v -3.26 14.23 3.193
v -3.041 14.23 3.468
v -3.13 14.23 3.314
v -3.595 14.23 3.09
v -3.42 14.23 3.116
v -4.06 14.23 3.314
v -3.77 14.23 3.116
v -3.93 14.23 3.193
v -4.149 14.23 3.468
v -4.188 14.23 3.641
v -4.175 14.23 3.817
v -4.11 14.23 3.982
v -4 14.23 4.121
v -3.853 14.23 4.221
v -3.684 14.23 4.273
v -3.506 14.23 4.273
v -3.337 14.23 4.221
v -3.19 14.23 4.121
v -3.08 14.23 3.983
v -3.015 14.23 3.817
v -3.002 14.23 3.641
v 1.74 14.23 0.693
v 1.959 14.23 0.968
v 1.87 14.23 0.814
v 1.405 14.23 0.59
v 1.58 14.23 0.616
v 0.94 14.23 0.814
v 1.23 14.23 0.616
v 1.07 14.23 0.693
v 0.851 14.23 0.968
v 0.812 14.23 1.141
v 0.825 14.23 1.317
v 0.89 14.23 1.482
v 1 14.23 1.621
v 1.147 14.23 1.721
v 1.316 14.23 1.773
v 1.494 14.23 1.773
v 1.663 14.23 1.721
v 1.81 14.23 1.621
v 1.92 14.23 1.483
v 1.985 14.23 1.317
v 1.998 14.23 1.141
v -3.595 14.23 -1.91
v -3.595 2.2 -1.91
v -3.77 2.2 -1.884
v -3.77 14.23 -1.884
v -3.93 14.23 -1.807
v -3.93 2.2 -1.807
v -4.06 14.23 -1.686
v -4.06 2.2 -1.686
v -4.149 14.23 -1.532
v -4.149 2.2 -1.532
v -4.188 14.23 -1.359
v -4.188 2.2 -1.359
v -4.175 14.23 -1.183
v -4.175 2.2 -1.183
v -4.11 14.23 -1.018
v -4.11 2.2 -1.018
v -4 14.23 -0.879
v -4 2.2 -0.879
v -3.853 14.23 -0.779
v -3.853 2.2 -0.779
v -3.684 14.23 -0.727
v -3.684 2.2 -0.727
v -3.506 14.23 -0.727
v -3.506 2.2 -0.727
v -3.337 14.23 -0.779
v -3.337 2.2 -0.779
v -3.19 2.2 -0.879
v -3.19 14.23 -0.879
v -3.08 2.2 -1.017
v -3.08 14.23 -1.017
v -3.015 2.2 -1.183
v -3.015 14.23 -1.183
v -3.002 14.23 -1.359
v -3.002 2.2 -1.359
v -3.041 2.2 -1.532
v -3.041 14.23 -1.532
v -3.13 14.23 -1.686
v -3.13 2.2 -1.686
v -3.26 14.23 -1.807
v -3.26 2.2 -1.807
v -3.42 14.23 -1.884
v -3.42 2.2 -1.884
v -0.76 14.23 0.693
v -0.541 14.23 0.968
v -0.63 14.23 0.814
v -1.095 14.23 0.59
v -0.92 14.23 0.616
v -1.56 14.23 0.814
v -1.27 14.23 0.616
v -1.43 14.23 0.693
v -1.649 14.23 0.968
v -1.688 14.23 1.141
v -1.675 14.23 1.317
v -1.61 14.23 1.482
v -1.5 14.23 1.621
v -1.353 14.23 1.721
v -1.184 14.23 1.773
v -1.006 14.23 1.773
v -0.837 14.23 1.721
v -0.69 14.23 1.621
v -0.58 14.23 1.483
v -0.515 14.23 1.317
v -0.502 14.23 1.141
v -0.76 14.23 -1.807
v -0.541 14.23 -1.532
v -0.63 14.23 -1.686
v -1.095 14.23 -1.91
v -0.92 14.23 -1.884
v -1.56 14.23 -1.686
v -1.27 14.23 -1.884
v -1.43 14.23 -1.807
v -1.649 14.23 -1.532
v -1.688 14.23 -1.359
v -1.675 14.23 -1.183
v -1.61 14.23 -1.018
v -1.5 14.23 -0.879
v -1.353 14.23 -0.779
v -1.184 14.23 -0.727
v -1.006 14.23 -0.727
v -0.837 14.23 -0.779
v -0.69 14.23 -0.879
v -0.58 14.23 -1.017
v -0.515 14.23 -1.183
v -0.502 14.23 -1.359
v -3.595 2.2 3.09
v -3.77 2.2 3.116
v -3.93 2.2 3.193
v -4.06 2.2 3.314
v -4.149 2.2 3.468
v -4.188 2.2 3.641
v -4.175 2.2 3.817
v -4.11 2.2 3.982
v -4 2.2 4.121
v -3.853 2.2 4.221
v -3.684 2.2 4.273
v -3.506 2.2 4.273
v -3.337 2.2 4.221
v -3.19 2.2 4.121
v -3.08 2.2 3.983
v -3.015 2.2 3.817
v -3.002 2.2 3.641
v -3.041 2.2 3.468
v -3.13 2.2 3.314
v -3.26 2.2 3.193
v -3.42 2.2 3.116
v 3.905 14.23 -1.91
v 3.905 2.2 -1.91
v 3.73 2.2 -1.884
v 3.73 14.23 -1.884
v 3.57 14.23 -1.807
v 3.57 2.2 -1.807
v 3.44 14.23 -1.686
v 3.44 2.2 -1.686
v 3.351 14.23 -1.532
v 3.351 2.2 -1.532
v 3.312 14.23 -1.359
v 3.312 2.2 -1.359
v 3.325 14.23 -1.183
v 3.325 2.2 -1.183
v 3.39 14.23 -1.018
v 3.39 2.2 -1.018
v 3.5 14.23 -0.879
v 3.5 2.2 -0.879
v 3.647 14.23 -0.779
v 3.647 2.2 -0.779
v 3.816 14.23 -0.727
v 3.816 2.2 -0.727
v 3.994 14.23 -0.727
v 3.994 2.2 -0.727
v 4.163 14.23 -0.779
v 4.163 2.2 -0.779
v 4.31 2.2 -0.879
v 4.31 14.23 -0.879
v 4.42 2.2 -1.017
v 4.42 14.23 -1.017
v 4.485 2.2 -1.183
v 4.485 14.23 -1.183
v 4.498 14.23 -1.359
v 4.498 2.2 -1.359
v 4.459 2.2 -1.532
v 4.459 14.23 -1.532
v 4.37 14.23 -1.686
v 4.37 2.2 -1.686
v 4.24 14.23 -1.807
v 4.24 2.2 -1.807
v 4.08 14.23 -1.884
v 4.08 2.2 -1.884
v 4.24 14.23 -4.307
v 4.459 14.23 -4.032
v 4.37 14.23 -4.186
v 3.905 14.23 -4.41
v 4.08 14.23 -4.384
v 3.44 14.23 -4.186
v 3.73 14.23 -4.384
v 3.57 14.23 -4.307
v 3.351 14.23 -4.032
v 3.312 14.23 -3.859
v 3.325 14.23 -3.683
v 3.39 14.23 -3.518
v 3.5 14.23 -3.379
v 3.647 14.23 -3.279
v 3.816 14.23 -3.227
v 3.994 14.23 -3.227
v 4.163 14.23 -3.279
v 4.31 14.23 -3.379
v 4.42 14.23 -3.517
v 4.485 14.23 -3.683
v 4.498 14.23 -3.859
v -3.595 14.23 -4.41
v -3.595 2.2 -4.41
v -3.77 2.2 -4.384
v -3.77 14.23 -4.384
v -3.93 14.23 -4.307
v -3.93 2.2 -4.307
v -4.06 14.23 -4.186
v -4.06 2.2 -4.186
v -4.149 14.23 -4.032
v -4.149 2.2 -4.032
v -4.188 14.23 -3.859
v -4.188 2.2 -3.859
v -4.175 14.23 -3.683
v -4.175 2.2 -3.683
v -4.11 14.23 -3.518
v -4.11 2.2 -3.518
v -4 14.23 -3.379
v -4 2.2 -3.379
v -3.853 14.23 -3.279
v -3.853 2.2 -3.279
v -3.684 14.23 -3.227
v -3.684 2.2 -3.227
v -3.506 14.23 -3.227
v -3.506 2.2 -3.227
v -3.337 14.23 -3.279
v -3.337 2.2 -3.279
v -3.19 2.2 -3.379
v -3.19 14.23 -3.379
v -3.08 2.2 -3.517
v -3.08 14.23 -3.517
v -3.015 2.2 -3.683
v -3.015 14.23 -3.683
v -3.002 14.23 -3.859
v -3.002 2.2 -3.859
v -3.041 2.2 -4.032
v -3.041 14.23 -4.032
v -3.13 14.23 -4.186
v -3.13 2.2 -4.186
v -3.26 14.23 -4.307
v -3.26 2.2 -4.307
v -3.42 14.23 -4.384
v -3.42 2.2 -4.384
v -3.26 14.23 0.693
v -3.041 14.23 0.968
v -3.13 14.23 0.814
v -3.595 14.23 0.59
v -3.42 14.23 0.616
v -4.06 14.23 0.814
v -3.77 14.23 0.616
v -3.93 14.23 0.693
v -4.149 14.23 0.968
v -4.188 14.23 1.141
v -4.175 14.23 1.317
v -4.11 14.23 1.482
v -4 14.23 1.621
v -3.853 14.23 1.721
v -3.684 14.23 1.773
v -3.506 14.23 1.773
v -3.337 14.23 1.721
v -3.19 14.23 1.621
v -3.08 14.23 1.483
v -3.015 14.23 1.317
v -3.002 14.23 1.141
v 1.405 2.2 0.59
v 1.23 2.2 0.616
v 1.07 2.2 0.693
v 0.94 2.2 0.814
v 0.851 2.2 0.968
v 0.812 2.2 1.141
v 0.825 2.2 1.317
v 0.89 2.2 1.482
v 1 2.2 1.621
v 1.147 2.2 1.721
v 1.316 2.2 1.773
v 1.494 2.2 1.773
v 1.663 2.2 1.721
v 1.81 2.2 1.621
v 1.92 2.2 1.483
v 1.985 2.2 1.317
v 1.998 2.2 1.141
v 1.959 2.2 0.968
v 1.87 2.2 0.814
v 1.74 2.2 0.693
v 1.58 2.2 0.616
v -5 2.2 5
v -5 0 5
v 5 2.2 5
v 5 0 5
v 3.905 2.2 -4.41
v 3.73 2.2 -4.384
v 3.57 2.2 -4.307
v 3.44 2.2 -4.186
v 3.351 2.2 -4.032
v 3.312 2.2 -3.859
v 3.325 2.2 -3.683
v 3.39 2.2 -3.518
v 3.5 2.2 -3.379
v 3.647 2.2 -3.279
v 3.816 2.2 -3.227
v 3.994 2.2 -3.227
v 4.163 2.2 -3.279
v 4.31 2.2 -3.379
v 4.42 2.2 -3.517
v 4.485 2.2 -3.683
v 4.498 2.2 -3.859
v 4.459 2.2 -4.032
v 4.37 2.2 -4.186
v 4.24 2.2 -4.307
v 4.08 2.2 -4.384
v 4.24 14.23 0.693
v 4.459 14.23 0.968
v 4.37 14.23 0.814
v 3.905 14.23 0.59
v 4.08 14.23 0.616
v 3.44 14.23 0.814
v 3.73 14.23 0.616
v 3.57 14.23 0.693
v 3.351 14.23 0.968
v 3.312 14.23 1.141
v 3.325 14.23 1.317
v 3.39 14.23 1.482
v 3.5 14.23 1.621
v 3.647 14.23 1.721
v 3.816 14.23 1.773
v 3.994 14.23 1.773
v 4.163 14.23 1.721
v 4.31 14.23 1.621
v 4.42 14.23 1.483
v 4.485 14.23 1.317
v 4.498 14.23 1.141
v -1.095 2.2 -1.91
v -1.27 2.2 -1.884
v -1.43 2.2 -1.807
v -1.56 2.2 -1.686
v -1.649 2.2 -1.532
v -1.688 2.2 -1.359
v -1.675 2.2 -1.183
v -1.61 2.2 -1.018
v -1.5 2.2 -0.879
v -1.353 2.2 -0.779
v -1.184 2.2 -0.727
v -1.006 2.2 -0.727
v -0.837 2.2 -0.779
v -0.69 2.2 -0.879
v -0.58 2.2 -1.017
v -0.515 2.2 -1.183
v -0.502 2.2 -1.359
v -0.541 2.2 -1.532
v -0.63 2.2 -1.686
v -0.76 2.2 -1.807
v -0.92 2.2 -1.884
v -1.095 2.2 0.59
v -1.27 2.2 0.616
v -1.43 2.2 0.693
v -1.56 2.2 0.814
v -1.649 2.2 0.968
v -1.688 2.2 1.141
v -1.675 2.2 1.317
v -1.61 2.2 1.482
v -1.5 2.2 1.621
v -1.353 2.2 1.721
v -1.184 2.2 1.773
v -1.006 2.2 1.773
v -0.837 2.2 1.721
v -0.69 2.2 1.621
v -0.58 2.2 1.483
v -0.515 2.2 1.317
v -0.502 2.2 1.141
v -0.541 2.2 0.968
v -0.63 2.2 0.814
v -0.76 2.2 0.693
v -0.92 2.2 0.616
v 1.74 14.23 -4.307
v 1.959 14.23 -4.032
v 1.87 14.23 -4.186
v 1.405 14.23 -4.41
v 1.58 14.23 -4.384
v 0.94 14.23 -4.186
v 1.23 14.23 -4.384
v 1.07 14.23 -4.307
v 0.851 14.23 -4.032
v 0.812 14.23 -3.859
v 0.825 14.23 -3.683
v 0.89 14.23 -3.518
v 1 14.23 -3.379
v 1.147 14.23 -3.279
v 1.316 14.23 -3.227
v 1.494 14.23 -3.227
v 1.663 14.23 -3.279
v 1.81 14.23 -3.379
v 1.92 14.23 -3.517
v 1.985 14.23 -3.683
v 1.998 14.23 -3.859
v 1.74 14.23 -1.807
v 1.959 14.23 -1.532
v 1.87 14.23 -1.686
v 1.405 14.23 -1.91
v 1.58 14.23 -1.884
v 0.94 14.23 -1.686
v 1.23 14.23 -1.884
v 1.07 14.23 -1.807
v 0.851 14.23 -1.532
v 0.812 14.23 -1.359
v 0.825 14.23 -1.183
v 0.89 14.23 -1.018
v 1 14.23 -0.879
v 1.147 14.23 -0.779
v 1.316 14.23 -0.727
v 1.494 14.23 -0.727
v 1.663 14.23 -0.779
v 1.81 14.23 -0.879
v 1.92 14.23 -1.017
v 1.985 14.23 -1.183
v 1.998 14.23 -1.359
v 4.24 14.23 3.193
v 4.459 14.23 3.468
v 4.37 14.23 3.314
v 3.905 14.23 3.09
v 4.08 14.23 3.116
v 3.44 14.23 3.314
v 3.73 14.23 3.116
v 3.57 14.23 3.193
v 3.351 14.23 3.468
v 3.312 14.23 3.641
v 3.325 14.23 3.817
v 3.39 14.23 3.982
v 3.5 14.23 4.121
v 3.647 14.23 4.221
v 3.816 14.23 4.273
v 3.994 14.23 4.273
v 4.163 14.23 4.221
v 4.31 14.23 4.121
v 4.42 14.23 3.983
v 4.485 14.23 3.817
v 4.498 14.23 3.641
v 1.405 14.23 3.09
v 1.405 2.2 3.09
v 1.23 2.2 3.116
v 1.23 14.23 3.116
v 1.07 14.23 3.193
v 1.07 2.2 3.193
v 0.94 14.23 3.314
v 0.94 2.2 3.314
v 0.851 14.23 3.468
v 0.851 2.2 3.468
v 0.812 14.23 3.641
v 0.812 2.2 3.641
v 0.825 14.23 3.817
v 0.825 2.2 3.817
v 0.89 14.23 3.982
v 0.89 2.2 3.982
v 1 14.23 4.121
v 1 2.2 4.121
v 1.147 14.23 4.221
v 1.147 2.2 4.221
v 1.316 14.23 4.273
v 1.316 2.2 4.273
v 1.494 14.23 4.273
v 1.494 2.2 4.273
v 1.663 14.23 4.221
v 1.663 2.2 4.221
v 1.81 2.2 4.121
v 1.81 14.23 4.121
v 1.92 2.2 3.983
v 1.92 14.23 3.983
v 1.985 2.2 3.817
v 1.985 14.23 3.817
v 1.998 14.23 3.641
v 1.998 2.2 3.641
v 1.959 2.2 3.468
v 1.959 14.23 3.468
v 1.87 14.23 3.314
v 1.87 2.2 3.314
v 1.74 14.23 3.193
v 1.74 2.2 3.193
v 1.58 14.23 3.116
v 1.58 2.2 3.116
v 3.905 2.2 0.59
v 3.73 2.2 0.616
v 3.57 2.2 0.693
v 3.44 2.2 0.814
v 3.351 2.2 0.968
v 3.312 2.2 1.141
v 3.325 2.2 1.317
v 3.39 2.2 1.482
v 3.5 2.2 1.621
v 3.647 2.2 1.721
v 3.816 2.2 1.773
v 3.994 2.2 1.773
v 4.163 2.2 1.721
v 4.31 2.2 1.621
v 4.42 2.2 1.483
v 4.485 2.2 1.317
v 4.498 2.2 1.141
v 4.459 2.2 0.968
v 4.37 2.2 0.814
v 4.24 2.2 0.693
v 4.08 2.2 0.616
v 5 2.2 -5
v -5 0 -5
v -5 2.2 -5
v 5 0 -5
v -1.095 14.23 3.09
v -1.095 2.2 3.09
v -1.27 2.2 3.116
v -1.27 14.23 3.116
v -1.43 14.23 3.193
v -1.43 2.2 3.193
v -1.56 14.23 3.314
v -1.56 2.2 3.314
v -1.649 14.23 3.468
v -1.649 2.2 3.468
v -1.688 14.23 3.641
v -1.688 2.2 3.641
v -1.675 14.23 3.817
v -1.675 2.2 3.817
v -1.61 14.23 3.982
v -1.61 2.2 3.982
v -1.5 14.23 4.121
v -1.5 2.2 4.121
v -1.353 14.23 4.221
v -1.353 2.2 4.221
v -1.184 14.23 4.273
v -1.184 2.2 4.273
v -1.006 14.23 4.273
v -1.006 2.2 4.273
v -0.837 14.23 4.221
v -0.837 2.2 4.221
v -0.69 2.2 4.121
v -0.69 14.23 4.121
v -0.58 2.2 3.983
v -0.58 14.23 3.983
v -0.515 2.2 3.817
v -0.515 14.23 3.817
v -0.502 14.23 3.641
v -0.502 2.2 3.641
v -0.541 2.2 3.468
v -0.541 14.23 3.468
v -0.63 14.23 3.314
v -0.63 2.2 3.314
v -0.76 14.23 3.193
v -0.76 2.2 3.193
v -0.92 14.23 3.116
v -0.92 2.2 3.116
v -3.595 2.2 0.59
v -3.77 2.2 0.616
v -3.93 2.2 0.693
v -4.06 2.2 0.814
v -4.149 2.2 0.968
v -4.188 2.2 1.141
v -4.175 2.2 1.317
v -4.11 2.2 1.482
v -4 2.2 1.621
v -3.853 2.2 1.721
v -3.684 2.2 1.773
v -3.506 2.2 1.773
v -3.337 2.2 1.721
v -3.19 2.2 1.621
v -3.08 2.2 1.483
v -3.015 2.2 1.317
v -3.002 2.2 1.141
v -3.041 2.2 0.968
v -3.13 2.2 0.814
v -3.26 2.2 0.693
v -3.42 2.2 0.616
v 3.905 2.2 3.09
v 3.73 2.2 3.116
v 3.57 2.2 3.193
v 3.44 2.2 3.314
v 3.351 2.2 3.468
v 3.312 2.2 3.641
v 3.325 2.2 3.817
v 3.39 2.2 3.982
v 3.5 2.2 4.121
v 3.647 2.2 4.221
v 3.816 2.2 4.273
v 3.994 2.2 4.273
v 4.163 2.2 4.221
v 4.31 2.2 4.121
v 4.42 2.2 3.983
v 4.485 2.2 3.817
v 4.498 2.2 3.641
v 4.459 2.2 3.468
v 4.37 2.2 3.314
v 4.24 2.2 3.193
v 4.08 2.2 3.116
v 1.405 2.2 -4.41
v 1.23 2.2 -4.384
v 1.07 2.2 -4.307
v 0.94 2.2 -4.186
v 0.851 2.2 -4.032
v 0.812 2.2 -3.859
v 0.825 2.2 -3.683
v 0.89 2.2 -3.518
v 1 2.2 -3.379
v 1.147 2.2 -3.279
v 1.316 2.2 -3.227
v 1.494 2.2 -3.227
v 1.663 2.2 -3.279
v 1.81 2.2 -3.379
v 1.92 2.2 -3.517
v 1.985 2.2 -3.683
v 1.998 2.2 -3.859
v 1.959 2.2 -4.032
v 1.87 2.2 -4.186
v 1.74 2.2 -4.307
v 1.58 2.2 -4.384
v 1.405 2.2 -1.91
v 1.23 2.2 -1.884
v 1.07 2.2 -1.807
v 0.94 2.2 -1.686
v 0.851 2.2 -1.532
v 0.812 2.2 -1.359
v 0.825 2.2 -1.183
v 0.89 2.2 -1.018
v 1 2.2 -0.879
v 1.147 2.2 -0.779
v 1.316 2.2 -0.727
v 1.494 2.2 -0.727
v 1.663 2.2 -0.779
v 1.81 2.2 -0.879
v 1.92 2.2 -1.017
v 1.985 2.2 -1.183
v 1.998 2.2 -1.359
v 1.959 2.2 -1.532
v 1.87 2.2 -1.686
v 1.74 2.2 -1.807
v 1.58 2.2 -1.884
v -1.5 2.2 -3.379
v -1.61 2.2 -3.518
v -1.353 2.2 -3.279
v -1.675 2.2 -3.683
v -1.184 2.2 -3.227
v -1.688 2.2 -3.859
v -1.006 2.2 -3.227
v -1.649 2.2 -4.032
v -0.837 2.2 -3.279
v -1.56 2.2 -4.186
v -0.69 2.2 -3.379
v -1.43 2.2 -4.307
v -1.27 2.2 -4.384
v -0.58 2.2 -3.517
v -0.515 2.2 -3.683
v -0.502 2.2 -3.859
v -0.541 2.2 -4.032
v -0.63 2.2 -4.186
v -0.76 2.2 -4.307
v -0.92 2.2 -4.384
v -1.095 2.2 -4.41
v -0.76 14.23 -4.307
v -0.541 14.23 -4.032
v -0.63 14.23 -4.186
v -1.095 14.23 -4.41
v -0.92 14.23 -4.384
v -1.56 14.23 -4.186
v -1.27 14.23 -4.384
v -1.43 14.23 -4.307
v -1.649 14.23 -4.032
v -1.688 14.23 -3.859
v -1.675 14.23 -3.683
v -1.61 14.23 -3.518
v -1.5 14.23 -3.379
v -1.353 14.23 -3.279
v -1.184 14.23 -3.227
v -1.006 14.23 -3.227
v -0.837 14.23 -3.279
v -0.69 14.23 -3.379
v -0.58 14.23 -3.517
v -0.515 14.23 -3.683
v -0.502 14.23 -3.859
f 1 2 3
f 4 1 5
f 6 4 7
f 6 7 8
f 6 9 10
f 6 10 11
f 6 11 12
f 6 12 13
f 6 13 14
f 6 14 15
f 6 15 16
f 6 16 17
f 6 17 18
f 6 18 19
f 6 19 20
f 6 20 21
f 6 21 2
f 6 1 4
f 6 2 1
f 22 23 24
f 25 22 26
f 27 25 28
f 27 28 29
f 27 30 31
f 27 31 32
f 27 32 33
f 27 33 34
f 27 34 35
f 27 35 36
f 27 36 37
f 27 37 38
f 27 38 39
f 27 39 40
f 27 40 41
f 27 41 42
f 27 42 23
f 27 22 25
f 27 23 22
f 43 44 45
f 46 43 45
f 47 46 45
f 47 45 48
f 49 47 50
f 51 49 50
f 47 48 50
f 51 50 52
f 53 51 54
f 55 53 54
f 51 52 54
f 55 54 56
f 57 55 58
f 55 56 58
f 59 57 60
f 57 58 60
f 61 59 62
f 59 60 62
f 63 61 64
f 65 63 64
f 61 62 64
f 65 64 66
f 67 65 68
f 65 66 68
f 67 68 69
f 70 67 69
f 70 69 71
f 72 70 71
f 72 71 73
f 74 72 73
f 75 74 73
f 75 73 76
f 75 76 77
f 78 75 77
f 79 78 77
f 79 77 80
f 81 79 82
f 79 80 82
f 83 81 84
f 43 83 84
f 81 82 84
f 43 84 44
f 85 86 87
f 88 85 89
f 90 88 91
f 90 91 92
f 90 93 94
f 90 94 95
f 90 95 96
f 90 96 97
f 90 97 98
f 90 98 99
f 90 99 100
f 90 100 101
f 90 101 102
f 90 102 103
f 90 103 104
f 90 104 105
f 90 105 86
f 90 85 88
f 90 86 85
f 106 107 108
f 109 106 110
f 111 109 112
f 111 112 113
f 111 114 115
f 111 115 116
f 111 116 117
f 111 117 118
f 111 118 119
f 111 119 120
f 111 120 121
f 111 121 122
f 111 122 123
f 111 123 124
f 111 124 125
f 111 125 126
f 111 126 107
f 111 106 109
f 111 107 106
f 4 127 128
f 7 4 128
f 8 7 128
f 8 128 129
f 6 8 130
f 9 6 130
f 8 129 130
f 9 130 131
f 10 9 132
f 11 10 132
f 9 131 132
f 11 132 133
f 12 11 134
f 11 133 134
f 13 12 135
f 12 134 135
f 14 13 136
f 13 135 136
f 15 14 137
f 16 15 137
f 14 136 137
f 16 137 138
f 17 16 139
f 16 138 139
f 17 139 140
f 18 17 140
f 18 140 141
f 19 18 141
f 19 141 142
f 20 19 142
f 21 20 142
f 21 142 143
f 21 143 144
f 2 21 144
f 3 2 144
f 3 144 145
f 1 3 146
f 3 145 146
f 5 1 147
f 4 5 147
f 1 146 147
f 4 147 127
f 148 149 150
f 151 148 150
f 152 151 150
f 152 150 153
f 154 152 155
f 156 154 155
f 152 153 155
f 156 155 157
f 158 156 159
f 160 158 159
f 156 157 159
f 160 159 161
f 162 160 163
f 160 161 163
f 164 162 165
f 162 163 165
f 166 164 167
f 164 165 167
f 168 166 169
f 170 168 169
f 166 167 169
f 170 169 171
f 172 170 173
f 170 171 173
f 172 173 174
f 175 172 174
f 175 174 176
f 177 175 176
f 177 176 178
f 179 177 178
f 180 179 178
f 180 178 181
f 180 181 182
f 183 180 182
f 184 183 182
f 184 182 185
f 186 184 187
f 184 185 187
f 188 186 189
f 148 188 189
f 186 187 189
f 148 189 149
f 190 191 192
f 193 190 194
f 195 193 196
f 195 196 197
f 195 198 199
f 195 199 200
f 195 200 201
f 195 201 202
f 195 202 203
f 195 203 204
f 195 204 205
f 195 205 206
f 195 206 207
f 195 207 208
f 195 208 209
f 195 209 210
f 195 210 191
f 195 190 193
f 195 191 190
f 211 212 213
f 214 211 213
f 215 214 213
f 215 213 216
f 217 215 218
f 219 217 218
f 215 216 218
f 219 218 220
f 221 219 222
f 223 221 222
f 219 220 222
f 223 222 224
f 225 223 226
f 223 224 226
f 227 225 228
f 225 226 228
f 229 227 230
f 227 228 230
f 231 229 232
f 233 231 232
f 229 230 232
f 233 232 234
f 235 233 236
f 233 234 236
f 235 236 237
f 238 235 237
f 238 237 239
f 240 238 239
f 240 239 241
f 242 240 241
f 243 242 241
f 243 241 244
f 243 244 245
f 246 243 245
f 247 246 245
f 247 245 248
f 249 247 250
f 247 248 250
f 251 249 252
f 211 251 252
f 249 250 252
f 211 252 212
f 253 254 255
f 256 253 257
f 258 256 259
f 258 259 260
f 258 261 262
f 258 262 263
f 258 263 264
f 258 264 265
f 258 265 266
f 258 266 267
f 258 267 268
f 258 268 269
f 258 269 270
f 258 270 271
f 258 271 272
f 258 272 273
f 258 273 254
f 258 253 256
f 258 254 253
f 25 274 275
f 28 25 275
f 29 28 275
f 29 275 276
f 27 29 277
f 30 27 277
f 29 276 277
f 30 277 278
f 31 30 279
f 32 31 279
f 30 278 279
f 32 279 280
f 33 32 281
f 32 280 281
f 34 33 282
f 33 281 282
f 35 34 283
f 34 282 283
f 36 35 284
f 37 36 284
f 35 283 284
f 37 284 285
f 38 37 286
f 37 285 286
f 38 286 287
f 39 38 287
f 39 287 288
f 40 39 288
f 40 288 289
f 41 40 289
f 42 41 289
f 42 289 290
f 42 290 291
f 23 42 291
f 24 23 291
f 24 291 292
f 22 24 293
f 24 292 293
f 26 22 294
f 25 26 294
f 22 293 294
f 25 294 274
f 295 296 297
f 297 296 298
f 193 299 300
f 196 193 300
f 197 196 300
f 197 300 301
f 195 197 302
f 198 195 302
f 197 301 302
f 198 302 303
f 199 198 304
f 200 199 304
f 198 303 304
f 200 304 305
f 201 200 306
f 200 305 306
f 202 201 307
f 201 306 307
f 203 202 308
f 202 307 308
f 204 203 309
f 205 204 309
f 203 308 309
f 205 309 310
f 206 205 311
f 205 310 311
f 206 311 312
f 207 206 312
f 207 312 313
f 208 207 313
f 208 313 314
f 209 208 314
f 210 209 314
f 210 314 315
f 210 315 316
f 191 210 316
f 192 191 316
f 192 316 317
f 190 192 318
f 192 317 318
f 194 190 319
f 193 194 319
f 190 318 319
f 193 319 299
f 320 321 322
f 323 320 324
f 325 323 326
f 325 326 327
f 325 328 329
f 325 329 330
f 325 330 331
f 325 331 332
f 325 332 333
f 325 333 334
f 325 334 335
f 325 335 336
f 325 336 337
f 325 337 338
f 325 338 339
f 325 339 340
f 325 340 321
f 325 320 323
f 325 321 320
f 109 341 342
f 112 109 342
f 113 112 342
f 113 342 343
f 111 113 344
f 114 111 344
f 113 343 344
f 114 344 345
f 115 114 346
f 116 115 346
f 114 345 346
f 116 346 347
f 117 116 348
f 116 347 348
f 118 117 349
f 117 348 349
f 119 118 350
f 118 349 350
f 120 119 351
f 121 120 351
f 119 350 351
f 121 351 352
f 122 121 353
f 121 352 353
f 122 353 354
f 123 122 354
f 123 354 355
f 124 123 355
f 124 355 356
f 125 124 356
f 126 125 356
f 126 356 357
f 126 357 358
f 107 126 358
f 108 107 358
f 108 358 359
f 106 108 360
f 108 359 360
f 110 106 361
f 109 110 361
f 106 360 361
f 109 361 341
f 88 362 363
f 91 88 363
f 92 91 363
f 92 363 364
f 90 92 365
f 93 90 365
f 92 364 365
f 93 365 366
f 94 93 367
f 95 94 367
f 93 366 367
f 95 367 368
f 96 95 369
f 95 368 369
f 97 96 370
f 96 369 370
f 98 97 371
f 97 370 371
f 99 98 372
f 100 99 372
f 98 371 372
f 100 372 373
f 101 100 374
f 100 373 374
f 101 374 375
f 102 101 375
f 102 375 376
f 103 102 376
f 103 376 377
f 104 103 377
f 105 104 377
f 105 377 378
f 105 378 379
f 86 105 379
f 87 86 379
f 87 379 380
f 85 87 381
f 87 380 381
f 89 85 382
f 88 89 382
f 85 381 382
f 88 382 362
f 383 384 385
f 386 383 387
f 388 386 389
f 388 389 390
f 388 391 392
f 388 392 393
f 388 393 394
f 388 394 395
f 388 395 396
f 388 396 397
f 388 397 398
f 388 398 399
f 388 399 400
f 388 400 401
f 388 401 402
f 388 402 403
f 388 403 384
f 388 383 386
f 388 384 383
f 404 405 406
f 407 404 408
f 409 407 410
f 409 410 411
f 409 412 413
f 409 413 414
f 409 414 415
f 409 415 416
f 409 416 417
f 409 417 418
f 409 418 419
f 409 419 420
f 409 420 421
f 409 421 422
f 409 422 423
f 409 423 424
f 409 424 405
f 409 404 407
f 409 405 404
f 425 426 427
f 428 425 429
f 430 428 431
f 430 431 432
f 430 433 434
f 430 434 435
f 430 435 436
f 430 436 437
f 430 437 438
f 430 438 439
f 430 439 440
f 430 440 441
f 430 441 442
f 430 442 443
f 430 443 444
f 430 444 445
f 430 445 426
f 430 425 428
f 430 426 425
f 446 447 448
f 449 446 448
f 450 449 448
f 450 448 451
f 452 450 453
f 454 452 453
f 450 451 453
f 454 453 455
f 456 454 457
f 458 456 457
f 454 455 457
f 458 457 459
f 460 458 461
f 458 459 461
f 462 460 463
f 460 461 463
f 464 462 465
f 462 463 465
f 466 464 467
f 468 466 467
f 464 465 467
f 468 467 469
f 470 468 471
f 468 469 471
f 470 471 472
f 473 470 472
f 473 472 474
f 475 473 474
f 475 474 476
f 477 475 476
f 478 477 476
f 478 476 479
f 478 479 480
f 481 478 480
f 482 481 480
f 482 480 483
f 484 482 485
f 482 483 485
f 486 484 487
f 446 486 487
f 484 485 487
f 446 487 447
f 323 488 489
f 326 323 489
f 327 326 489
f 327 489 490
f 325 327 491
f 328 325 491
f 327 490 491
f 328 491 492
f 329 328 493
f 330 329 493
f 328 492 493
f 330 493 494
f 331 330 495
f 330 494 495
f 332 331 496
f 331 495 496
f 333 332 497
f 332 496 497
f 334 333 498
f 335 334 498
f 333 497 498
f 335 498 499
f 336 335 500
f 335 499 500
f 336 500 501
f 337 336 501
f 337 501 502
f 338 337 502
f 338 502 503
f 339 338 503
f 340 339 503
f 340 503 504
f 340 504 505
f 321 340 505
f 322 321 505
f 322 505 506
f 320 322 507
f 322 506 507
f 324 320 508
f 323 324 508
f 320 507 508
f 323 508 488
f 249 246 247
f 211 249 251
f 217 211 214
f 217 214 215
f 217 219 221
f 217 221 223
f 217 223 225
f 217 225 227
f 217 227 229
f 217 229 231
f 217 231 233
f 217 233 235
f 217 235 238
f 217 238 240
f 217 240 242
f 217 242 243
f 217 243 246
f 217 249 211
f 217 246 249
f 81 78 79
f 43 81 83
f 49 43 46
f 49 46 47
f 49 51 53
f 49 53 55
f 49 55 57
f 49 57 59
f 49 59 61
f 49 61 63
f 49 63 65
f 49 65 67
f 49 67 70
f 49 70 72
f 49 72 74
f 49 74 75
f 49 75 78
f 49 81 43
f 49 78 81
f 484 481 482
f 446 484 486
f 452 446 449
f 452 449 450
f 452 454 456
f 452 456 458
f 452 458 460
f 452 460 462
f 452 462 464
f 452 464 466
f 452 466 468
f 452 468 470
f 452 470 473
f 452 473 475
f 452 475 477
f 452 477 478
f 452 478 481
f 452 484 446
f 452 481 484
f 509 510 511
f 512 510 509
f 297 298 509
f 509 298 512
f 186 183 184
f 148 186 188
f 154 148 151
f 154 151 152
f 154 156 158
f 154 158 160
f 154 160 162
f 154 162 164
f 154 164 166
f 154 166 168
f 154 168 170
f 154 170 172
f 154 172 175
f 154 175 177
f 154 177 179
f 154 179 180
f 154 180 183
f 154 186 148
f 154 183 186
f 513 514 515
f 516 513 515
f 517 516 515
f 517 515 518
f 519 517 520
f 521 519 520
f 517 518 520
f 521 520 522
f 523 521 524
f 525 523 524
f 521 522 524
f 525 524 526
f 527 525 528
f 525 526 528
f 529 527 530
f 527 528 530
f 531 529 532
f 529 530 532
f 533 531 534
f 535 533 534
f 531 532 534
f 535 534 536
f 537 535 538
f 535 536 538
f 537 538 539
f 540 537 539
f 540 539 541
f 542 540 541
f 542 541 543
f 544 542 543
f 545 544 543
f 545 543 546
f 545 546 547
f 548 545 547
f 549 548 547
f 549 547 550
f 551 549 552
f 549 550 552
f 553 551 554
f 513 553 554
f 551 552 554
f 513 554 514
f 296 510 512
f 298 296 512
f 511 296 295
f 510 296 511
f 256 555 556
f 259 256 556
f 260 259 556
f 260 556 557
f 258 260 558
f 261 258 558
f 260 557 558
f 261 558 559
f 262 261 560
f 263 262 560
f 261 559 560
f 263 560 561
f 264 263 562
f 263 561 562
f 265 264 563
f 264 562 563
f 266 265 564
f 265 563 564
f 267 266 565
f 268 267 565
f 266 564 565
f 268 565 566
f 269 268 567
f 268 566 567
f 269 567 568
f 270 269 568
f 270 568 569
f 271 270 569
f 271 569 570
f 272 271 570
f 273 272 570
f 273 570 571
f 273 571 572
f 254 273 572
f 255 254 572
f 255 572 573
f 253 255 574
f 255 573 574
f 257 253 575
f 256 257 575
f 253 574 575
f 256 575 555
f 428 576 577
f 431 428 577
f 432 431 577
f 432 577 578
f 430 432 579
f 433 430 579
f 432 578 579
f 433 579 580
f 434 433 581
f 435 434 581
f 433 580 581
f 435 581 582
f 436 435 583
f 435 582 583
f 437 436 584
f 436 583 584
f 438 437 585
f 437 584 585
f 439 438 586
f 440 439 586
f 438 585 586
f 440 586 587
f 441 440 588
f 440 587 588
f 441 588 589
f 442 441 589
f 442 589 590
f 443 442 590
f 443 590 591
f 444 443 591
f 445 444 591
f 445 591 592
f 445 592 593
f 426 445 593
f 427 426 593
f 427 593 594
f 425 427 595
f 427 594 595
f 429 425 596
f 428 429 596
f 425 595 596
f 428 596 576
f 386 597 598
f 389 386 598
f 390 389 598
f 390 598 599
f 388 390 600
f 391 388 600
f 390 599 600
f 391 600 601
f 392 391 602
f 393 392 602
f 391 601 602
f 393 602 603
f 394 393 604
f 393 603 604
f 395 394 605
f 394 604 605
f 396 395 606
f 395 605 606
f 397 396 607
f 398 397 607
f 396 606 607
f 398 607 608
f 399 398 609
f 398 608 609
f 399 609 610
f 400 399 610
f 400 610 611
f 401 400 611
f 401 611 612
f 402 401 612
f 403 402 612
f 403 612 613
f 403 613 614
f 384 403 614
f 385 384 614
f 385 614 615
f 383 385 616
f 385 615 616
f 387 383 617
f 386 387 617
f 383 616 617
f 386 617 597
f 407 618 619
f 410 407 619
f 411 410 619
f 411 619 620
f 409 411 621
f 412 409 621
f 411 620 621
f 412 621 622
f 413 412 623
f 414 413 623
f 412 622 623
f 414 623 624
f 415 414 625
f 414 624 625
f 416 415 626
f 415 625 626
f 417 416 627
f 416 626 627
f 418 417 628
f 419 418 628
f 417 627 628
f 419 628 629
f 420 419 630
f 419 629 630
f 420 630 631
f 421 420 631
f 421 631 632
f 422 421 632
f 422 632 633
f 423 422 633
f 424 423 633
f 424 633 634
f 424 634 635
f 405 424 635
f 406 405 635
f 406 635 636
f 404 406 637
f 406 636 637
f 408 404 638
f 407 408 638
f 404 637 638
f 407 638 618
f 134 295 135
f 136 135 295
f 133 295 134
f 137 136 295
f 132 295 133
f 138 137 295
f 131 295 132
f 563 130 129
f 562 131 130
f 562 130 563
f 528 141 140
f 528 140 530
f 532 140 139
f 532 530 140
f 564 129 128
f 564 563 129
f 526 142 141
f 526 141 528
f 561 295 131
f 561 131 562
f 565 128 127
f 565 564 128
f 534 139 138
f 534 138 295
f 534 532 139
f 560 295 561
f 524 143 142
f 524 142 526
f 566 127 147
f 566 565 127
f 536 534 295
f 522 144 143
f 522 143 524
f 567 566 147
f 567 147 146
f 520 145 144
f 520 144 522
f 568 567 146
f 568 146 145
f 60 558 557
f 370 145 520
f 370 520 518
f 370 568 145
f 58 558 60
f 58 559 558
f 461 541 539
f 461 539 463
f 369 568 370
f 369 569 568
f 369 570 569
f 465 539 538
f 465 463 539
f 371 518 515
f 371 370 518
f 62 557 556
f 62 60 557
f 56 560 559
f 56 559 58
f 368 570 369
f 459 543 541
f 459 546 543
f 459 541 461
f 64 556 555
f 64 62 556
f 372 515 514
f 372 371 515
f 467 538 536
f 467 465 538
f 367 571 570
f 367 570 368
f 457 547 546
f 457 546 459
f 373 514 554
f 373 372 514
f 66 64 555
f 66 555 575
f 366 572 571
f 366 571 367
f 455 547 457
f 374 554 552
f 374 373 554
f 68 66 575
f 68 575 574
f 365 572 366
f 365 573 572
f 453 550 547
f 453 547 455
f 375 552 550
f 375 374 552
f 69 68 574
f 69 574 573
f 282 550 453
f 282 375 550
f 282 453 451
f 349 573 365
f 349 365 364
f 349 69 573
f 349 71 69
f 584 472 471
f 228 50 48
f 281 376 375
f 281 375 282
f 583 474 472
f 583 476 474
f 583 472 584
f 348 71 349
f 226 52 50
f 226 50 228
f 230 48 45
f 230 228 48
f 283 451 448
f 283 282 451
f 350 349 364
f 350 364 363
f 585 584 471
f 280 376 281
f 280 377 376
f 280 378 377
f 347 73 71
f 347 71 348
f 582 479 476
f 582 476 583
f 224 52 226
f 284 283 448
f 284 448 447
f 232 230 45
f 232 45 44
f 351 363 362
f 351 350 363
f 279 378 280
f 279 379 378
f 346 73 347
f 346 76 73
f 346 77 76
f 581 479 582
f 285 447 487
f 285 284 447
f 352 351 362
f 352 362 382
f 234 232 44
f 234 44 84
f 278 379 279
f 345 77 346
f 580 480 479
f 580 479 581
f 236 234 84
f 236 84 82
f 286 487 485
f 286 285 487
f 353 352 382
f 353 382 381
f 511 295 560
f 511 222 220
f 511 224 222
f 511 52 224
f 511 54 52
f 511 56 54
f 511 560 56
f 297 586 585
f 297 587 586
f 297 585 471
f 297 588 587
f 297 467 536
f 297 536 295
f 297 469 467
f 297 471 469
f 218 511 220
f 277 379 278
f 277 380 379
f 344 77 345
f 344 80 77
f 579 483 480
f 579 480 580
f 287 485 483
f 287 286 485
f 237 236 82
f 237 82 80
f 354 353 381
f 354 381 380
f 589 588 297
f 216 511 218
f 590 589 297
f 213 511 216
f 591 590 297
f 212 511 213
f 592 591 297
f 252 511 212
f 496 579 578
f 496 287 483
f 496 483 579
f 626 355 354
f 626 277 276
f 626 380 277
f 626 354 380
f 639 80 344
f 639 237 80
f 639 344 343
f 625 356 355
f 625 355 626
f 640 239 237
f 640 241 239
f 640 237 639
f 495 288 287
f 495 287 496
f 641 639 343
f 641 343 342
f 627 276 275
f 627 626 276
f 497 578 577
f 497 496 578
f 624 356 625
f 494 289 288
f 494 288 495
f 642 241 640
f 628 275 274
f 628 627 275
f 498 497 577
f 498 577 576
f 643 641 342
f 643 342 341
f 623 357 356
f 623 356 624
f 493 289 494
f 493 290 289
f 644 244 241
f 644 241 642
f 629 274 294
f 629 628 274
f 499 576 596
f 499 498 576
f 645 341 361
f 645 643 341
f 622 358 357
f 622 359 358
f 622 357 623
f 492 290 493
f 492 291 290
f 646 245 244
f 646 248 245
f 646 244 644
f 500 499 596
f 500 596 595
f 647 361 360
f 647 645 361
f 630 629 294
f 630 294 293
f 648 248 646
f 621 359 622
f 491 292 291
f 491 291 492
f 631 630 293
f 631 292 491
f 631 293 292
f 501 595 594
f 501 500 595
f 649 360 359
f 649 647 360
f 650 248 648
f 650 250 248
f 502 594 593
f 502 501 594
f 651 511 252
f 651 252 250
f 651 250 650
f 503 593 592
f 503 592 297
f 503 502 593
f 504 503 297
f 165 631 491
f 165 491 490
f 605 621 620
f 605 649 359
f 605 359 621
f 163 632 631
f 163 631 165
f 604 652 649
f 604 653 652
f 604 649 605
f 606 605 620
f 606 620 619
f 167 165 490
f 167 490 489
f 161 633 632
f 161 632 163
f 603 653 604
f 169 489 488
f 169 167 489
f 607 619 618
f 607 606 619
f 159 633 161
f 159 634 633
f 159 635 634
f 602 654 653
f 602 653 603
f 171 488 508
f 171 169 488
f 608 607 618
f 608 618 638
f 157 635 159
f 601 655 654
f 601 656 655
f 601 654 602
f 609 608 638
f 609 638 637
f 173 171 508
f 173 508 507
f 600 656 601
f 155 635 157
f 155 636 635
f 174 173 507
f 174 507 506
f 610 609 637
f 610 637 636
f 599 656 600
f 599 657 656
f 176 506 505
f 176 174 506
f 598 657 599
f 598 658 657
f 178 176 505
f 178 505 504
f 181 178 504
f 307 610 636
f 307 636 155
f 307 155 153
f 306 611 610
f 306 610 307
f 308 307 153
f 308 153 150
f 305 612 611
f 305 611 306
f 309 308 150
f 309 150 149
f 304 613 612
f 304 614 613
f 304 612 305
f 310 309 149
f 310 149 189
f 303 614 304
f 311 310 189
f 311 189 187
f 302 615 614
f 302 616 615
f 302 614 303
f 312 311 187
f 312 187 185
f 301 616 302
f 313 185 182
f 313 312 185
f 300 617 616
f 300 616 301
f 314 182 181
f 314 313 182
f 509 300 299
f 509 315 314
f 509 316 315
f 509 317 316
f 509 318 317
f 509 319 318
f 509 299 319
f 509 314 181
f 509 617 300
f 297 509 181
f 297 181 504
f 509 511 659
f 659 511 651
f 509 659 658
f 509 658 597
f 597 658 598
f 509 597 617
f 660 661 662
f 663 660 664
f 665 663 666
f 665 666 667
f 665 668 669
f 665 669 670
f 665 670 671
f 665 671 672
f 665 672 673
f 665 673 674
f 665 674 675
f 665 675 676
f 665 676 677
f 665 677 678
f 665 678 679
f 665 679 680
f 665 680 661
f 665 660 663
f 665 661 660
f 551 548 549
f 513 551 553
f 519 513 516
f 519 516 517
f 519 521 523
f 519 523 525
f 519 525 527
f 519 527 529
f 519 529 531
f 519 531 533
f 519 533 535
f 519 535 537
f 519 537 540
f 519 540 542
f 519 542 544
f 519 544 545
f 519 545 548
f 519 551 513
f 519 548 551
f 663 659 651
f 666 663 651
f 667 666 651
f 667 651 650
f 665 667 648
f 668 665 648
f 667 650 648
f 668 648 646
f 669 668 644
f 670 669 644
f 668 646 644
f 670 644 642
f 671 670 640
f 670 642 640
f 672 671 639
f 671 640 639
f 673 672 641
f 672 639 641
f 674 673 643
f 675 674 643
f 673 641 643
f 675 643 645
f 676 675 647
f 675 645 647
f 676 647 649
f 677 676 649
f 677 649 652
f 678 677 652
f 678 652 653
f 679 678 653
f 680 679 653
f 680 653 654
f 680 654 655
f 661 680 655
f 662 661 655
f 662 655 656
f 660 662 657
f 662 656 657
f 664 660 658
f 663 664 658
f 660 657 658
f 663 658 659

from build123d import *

# Parameters (mm, degrees)
SKETCH1_W            = 10
SKETCH1_H            = 10
BOSS_EXTRUDE1_DEPTH  = 2.2
SKETCH2_R            = 0.595
BOSS_EXTRUDE2_DEPTH  = 12.03
LPATTERN1_COUNT      = 4
LPATTERN1_PITCH      = 2.5
LPATTERN1_COUNT_DIR2 = 4
LPATTERN1_PITCH_DIR2 = 2.5


with BuildPart() as part:
    # Sketch1 → Boss-Extrude1 (new body)
    with BuildSketch(Plane(origin=(0, 0, 0), x_dir=(1, 0, 0), z_dir=(0, 1, 0))):
        Rectangle(SKETCH1_W, SKETCH1_H)
    extrude(amount=BOSS_EXTRUDE1_DEPTH)

    # Sketch2 → Boss-Extrude2 (add)
    with BuildSketch(Plane(origin=(0, 2.2, 0), x_dir=(1, 0, 0), z_dir=(0, 1, 0))):
        with Locations(Location((-3.595, -3.685, 0), (0, 0, 90))):
            Circle(SKETCH2_R)
    boss_extrude2 = extrude(amount=BOSS_EXTRUDE2_DEPTH)

    # LPattern1: Boss-Extrude2 4 × 4
    with Locations(*[(i * LPATTERN1_PITCH, 0, -j * LPATTERN1_PITCH_DIR2) for i in range(LPATTERN1_COUNT) for j in range(LPATTERN1_COUNT_DIR2) if (i, j) != (0, 0)]):
        add(boss_extrude2)


solid = part.part
